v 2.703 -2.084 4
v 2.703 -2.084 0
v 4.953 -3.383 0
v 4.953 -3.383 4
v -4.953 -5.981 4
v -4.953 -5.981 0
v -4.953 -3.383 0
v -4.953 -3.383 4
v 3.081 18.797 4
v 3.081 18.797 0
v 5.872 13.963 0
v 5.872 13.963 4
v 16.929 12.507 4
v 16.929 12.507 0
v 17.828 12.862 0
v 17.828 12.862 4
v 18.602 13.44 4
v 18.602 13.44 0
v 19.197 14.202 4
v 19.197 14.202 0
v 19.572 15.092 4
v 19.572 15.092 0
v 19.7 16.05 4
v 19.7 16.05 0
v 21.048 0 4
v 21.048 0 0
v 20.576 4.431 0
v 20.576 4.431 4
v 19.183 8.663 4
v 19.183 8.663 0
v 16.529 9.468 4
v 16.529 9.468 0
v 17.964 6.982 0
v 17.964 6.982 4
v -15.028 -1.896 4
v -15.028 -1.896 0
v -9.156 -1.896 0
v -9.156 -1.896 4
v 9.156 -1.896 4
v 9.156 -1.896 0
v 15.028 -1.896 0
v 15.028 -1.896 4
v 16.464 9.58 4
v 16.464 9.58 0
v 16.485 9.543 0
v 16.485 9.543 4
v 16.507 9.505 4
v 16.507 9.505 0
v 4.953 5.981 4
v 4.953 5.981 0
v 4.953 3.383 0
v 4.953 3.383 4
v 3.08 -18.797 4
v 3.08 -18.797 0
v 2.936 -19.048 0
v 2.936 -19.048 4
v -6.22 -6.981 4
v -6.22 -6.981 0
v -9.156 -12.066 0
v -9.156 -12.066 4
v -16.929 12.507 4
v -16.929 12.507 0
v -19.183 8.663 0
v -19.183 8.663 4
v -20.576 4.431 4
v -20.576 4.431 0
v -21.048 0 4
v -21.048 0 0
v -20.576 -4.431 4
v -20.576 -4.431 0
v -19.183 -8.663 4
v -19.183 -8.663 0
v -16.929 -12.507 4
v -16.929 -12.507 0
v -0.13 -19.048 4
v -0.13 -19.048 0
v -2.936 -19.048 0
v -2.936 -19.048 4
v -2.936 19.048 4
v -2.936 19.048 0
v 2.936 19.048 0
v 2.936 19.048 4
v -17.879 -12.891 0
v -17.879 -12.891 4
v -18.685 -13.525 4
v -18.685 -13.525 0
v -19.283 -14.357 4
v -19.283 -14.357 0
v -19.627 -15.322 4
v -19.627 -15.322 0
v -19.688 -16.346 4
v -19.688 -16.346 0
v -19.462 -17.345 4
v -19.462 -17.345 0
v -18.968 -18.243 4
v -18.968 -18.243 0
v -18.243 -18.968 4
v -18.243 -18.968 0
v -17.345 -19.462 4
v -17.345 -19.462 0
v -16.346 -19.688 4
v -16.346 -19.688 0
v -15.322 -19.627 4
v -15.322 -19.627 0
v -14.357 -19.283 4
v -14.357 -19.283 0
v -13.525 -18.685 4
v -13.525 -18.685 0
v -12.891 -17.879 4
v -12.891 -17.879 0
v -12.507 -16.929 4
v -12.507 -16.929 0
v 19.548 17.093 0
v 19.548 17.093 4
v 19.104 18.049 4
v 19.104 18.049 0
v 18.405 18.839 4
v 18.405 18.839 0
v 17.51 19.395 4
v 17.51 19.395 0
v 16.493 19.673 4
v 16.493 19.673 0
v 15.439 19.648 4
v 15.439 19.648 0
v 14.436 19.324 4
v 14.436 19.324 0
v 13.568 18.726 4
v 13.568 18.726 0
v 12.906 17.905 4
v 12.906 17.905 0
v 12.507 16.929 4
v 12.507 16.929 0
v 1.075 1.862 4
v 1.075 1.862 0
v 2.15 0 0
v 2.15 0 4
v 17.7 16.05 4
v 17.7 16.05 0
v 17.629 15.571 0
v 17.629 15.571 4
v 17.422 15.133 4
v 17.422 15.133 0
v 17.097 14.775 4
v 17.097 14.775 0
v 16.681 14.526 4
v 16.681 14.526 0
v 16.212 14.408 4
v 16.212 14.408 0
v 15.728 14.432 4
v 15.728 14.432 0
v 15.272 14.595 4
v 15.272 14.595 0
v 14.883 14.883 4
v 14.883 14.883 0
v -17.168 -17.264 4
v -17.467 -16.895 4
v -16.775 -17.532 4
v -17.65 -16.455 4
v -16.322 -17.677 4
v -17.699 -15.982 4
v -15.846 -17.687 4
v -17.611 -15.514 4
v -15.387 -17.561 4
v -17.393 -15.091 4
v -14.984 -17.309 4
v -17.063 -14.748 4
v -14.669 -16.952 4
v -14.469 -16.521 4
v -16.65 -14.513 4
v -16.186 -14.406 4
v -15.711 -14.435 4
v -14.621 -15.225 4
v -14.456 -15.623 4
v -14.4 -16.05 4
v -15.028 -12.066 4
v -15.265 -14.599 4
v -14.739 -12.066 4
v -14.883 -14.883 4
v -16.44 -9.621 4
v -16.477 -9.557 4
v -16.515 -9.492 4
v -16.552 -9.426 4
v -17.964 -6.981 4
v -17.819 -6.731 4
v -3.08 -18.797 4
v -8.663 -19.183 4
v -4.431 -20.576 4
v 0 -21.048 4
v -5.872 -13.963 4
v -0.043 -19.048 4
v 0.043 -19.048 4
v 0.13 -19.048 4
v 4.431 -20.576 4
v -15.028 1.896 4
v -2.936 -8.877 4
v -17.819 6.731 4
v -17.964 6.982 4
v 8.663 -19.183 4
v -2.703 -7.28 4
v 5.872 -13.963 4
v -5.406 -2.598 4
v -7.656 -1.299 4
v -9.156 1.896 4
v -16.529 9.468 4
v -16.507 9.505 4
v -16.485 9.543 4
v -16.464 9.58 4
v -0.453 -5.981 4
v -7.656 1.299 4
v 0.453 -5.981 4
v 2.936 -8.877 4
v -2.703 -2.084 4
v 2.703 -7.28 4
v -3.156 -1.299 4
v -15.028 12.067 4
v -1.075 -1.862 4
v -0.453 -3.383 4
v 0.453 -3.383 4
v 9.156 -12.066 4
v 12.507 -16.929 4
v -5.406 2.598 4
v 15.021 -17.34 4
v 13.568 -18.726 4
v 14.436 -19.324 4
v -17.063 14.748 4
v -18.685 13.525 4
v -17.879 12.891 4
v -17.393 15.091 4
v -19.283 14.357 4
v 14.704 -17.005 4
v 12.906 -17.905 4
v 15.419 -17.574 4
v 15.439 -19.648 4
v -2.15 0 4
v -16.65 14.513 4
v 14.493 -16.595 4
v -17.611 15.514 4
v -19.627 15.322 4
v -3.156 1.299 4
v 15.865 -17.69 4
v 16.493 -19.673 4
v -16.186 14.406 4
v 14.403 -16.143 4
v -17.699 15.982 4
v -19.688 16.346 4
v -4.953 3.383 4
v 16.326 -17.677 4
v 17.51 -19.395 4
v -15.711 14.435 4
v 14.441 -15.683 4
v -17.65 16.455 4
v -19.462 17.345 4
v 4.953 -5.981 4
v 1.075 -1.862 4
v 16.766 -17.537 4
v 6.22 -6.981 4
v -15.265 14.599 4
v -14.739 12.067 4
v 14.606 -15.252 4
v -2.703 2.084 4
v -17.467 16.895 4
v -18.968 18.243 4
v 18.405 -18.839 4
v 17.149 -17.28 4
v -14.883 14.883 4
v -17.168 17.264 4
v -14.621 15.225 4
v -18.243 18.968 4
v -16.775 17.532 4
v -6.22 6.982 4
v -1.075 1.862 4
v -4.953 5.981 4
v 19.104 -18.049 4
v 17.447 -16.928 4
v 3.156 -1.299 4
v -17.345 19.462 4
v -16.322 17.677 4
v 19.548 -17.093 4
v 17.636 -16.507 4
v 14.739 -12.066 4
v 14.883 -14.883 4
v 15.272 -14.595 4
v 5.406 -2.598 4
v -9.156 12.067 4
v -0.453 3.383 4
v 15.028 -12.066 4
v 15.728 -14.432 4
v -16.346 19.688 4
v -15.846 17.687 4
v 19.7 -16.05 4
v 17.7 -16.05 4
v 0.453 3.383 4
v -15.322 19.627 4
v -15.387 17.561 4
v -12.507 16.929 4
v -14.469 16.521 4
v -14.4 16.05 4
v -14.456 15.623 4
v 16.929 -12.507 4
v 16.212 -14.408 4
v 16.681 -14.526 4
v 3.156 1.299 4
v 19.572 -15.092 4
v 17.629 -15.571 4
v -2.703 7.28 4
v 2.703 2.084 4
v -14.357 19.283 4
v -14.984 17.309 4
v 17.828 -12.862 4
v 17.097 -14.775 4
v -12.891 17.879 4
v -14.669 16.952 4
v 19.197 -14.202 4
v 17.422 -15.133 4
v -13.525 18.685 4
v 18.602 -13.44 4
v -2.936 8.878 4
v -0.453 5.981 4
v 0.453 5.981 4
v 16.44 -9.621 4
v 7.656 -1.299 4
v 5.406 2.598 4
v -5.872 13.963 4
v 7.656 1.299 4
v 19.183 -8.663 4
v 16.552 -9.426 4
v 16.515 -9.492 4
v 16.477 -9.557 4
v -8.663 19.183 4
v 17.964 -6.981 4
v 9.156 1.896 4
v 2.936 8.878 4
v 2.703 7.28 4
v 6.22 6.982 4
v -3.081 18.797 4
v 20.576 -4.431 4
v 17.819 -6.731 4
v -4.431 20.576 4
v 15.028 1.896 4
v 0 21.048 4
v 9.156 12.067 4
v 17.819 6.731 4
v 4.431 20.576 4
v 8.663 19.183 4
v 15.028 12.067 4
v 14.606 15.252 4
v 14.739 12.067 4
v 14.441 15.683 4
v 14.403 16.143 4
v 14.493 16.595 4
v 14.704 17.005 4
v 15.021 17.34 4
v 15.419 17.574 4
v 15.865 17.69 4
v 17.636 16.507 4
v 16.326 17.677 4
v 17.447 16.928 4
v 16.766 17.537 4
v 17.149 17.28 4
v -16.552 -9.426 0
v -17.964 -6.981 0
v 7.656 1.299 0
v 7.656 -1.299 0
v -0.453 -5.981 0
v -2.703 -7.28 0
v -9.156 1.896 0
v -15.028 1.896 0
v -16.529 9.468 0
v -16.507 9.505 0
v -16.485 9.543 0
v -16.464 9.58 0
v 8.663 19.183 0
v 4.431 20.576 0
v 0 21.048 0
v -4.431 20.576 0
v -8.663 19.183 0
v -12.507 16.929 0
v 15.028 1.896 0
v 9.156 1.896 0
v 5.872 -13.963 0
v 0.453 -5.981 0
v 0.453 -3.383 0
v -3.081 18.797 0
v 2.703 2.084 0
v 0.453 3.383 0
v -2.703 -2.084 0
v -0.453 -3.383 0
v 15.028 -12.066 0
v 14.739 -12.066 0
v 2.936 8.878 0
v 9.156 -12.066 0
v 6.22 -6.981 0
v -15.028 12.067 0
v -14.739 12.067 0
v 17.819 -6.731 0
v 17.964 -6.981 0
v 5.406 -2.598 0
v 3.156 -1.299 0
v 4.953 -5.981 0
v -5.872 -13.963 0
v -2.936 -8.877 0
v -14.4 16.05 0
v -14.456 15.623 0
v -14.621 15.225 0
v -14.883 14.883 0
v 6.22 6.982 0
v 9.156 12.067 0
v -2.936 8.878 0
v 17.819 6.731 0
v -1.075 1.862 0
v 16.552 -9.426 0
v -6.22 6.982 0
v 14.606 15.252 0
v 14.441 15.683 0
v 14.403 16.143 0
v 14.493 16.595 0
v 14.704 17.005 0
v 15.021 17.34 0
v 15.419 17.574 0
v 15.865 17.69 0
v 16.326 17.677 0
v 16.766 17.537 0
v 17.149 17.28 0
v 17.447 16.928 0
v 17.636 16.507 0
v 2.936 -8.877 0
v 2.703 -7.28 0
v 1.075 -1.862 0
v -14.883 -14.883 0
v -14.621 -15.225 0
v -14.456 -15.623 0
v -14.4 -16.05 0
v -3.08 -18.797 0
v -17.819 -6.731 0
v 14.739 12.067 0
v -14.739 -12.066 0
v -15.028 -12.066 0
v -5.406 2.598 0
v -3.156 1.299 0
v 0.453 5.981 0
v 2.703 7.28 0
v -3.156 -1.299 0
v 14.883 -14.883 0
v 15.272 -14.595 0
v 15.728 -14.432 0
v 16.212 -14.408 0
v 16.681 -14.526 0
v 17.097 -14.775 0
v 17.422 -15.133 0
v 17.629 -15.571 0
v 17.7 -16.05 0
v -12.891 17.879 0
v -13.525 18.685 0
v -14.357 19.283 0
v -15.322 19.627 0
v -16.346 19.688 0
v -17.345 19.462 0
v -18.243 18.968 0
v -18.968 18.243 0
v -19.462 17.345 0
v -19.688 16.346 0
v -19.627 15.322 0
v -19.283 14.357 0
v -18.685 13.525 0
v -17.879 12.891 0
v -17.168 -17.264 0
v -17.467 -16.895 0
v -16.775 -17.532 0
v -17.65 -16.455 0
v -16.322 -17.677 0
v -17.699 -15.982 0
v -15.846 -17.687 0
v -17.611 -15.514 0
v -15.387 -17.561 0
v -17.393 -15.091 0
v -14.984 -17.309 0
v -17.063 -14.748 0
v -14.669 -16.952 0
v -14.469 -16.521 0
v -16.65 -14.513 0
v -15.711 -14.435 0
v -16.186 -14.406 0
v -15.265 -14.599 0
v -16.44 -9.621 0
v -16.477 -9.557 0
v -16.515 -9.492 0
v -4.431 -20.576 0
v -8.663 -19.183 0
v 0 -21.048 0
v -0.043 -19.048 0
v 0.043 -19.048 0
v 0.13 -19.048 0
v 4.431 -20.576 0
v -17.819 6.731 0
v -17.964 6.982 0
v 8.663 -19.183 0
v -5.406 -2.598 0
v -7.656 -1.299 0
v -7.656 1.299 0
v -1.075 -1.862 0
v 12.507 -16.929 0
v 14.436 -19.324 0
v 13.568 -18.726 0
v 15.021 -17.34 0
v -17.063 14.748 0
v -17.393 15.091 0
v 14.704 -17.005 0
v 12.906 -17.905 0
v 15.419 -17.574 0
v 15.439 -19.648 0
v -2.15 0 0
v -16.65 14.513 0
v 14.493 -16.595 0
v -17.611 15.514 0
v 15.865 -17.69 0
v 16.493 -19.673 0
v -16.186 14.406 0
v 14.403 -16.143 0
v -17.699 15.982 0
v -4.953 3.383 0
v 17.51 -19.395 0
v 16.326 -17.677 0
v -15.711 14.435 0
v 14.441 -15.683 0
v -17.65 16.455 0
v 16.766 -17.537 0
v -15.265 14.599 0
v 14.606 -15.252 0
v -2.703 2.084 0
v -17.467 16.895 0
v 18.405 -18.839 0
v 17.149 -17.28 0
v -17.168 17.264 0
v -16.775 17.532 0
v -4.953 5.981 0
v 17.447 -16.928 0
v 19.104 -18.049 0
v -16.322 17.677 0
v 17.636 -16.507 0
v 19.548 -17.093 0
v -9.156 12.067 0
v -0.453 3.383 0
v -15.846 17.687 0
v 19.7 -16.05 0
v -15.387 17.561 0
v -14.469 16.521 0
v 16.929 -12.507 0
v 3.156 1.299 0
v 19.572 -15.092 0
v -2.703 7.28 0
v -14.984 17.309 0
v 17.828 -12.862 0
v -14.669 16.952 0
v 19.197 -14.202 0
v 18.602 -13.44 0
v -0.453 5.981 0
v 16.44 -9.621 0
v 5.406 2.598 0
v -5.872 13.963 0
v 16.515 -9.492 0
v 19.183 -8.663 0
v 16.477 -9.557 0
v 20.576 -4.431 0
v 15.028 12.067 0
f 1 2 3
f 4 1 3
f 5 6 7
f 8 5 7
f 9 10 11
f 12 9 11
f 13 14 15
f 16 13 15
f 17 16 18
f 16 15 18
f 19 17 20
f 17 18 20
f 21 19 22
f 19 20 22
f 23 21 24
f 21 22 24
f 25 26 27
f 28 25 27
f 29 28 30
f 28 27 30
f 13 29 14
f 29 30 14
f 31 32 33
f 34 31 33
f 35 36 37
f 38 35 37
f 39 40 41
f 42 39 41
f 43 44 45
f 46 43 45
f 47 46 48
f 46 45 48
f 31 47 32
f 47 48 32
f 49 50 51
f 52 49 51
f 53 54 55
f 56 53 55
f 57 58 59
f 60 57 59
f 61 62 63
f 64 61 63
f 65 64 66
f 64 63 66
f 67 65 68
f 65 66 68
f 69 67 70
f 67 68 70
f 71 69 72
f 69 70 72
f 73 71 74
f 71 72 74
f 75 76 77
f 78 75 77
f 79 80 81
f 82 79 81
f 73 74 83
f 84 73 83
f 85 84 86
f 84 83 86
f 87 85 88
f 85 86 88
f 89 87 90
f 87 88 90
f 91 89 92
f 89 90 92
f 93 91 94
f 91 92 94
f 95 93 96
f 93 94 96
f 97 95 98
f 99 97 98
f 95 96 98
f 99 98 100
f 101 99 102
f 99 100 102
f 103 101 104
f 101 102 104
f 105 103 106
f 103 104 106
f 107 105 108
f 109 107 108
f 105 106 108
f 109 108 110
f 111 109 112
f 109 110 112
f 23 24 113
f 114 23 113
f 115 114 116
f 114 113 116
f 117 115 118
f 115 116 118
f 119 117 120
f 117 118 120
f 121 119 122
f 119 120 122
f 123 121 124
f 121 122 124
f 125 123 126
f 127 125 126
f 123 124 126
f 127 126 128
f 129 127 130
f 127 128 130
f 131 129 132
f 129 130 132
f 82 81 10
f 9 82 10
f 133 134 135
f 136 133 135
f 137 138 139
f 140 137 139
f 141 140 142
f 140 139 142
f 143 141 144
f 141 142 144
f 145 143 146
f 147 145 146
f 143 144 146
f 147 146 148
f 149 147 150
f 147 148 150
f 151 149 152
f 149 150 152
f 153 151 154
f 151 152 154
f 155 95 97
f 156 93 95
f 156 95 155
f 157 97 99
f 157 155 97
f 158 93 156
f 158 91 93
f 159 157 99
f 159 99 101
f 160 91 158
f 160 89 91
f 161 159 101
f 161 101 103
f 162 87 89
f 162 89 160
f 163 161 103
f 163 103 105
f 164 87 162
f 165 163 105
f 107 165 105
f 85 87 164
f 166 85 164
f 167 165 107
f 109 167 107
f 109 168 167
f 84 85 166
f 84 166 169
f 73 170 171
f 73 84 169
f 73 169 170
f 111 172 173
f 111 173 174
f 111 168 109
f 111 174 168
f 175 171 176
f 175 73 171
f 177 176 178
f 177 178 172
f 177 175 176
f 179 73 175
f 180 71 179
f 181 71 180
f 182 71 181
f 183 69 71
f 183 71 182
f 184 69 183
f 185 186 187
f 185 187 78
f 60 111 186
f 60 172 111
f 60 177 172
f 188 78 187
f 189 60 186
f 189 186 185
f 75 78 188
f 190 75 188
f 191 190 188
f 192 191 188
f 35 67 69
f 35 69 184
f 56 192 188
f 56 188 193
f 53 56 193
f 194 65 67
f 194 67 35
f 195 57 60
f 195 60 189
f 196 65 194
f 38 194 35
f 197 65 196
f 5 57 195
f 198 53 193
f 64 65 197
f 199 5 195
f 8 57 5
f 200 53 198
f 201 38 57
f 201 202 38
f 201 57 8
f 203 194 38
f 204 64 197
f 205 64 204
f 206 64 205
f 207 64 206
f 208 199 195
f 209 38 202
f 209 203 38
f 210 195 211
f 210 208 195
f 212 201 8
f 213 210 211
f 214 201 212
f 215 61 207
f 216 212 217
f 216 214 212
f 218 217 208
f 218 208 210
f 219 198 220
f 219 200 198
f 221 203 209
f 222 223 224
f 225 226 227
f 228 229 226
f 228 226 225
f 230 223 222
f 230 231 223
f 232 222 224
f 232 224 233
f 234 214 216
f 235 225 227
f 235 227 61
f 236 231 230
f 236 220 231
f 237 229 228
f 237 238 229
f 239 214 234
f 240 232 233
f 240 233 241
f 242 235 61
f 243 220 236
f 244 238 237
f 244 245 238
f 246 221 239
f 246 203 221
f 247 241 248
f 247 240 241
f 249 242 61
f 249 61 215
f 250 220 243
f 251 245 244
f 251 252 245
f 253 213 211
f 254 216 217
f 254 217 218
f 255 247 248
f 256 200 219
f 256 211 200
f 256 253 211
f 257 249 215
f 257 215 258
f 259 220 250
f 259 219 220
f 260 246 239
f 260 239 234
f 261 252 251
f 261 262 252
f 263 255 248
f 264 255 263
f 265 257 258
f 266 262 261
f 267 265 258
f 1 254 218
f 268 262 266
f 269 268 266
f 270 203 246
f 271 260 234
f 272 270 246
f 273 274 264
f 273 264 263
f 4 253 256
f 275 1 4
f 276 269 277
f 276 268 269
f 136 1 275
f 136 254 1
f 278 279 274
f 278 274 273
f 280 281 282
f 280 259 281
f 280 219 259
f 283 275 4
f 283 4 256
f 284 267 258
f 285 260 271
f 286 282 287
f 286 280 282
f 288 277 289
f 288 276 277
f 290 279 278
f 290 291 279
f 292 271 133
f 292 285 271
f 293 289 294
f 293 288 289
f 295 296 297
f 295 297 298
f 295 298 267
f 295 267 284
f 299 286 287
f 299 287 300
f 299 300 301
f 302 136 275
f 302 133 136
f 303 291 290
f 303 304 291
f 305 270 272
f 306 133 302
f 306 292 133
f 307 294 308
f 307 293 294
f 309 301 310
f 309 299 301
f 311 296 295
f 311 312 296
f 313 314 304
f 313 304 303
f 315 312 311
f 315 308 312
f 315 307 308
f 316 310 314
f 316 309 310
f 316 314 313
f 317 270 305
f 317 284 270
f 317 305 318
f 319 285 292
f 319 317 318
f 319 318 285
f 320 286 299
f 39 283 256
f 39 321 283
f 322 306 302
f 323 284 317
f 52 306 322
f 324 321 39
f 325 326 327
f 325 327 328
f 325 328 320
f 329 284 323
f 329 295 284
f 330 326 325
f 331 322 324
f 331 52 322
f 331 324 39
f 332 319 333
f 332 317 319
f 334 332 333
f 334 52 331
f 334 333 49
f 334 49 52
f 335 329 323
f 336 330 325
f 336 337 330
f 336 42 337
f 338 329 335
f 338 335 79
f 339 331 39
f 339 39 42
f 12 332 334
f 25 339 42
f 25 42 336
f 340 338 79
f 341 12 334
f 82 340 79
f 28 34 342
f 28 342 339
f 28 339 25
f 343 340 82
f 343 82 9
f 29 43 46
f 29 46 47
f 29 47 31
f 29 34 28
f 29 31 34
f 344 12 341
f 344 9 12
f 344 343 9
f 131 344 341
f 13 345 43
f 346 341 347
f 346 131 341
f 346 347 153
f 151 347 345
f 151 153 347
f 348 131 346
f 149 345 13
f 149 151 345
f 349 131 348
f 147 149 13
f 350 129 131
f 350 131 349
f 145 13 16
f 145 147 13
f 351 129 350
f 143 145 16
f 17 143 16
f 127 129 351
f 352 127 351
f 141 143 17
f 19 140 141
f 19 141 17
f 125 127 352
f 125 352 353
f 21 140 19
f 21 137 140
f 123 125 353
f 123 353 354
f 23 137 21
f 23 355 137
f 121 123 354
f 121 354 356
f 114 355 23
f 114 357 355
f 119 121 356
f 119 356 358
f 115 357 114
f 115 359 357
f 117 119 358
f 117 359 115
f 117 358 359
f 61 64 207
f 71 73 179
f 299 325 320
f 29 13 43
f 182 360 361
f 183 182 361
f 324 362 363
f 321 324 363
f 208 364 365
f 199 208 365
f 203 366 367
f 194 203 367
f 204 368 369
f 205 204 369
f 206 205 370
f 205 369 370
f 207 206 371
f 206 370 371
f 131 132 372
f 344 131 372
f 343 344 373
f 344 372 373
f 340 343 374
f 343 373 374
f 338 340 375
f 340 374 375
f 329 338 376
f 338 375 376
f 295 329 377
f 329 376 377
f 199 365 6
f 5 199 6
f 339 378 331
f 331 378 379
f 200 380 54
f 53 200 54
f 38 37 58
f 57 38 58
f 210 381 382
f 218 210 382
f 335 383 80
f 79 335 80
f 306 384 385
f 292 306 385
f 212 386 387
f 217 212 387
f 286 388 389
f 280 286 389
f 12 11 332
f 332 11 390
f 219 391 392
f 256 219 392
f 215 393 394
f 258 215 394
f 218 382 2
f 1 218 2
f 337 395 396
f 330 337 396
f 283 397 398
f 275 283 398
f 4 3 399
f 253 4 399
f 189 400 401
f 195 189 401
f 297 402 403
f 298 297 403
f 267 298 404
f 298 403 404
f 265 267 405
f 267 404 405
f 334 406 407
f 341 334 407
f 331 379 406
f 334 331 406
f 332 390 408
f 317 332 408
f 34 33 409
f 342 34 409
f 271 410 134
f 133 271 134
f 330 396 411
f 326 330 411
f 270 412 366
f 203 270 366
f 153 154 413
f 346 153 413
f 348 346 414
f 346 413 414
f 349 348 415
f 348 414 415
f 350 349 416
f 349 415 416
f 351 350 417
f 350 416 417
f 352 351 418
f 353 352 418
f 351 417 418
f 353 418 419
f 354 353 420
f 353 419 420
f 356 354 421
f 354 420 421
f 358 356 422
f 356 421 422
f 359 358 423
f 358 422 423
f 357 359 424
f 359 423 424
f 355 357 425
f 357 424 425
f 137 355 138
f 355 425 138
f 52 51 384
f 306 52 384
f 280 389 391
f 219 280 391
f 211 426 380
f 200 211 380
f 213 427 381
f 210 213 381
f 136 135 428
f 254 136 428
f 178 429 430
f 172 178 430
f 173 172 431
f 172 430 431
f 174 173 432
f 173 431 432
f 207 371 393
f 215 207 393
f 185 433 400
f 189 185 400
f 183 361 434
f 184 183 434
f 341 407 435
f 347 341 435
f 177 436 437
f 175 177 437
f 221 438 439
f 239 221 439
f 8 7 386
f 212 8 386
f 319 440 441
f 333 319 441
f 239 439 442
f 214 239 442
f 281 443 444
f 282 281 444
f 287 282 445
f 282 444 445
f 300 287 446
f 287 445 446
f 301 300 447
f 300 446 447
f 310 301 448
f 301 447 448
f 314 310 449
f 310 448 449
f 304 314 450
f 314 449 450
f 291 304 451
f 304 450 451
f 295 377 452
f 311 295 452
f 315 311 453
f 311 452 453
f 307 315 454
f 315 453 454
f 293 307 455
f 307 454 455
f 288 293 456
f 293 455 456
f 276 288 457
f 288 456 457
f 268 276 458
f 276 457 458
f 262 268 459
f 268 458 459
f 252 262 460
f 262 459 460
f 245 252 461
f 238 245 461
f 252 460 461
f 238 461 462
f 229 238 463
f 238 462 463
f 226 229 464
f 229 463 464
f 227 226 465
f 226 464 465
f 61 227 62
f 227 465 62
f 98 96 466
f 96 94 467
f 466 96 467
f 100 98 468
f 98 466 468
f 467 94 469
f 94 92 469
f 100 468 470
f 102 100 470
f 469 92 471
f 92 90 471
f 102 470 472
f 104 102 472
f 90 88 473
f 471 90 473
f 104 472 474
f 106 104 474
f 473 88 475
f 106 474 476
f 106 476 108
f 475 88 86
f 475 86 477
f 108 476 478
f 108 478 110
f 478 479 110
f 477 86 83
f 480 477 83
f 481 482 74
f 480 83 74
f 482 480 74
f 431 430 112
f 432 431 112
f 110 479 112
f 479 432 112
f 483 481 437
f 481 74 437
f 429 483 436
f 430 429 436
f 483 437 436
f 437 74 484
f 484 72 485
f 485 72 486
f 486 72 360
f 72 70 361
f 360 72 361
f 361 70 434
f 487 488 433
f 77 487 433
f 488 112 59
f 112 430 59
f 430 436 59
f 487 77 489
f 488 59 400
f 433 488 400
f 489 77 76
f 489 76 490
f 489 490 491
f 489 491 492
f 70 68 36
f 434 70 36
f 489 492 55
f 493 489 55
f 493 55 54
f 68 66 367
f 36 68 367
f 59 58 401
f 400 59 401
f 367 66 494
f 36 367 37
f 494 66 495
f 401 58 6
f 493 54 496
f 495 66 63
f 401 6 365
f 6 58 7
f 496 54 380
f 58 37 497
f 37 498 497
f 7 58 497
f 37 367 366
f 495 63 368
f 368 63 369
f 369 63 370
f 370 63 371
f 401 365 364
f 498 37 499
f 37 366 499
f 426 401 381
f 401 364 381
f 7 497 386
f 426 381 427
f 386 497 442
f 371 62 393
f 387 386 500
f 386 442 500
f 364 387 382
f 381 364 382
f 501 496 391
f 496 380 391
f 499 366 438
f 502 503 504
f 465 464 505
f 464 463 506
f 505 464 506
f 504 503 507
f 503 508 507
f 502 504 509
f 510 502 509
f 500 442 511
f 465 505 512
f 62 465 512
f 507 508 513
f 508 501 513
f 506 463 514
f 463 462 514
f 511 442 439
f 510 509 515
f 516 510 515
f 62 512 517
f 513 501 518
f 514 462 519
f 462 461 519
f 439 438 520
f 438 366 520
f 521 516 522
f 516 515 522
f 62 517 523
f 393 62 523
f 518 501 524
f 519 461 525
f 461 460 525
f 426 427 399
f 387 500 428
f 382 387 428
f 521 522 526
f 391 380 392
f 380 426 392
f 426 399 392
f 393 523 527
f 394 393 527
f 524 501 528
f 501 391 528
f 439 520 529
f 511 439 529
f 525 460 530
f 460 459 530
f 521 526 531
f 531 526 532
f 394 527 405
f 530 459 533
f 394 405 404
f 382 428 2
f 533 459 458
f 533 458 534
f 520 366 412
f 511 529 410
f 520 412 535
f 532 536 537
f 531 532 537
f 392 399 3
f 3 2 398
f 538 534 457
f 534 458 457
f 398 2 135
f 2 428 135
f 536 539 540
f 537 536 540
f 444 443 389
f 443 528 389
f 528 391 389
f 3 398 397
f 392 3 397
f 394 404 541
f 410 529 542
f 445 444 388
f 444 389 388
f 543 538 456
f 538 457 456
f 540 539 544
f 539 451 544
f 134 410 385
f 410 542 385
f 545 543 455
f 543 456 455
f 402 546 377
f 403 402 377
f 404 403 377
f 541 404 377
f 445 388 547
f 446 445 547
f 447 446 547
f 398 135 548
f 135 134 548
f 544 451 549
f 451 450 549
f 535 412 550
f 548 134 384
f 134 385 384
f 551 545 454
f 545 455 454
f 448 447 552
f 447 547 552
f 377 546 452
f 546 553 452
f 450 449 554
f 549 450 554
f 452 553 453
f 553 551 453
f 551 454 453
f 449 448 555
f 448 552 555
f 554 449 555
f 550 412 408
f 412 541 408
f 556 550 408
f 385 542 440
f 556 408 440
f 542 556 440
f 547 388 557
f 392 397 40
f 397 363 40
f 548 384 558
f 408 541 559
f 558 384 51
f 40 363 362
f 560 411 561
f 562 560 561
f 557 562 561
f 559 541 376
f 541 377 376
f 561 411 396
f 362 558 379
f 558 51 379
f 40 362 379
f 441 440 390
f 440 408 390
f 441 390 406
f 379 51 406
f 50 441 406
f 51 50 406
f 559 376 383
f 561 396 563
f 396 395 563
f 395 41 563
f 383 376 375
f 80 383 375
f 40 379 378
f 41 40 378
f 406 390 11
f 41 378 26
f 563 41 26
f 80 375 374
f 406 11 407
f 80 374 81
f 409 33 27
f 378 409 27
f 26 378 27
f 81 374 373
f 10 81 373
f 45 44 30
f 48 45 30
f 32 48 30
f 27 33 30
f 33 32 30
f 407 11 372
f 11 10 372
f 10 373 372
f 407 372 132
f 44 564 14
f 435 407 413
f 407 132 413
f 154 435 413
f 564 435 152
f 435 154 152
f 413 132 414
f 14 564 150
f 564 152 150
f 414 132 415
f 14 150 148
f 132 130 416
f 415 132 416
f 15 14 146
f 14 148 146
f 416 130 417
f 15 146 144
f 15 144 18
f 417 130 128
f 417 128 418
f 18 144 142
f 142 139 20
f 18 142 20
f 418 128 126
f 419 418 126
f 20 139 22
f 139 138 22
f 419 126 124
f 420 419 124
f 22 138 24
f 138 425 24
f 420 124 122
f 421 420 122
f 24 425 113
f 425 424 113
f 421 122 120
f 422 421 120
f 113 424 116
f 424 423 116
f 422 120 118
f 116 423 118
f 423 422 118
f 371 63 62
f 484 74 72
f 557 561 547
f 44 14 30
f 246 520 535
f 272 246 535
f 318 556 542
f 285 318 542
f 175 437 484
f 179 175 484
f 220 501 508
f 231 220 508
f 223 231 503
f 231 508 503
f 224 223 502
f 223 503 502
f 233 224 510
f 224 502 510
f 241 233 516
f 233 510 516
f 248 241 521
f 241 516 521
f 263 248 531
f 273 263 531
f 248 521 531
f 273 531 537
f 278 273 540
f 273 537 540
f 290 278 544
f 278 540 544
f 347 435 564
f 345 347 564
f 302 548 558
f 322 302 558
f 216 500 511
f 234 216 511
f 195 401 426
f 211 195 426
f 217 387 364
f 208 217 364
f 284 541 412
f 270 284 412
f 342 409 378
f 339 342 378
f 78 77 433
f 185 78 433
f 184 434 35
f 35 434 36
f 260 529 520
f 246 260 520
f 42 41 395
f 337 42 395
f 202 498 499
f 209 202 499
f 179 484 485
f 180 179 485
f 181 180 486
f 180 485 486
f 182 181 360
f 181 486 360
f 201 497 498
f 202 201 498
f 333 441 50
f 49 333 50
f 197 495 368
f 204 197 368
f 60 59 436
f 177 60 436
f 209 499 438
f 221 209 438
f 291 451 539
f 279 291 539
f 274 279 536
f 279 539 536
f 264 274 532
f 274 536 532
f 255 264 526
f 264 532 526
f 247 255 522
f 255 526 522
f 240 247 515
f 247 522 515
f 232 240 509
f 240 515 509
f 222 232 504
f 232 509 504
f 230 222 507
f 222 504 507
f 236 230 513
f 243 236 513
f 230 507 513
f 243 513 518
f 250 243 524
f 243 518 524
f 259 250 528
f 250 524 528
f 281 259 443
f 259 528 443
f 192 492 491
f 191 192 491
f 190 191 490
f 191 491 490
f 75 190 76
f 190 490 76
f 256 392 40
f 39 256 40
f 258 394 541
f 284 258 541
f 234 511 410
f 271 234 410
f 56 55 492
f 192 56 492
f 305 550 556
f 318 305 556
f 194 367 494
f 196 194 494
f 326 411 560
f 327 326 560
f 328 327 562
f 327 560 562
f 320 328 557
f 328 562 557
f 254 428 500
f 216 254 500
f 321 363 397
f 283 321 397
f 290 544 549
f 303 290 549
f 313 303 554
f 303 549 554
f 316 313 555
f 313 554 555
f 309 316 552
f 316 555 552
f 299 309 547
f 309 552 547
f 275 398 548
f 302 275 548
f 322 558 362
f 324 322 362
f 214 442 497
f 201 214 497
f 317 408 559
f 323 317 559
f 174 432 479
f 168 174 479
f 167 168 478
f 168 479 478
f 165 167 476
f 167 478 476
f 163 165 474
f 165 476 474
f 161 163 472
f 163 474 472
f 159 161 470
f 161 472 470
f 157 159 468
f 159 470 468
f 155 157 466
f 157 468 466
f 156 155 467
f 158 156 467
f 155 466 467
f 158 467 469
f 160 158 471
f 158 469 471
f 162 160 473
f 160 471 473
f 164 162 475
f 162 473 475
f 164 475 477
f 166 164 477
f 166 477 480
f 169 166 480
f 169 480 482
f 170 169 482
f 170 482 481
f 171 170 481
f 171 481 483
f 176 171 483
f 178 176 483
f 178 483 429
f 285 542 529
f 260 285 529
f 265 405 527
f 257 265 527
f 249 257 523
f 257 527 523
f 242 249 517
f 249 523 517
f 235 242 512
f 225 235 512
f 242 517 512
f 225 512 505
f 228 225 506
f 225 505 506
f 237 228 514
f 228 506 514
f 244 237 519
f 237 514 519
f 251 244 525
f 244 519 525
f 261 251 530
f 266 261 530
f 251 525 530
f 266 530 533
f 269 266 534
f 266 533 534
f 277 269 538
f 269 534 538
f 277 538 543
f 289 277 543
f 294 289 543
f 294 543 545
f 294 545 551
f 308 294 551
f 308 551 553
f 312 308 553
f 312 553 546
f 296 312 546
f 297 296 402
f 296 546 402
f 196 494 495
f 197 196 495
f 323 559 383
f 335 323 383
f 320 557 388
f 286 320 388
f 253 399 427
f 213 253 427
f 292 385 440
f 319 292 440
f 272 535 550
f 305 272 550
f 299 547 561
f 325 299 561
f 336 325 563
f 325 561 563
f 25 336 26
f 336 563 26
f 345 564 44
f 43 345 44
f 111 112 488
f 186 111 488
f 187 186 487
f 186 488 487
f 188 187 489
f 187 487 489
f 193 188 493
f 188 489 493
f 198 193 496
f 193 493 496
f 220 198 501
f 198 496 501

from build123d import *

# Parameters (mm, degrees)
F1_DEPTH = 4


# Not quite as in the source:
# - ends of sketch curves that miss each other by under 0.0002 mm in the source are joined


with BuildPart() as f1:
    # F0 (on Top) → F1 (new body)
    with BuildSketch(Plane.XY):
        with BuildLine():
            ThreePointArc((-14.8832723697, 14.8832737265), (-15.9503966088, 13.7334803044), (-16.9289242157, 12.5074041331))
            ThreePointArc((-16.9289242157, 12.5074041331), (-15.0725488028, 12.533313309), (-13.4690596421, 13.4690608552))
            ThreePointArc((-13.4690596421, 13.4690608552), (-12.6778389857, 14.6532061326), (-12.3999992371, 16.0500007629))
            ThreePointArc((-12.3999992371, 16.0500007629), (-12.4269495545, 16.4927320562), (-12.5074025236, 16.9289254048))
            ThreePointArc((-12.5074025236, 16.9289254048), (-13.7334788191, 15.9503978876), (-14.8832723697, 14.8832737265))
        make_face()
        with BuildLine():
            ThreePointArc((12.5074038131, 16.9289244521), (8.016e-07, 21.0481265971), (-12.5074025236, 16.9289254048))
            ThreePointArc((-12.5074025236, 16.9289254048), (-12.4269495545, 16.4927320562), (-12.3999992371, 16.0500007629))
            ThreePointArc((-12.3999992371, 16.0500007629), (-12.6778389857, 14.6532061326), (-13.4690596421, 13.4690608552))
            ThreePointArc((-13.4690596421, 13.4690608552), (-8.6931773802, 16.9487401861), (-3.0807040231, 18.7973506001))
            Line((-3.0807040231, 18.7973506001), (-2.9359184337, 19.0481265971))
            Line((-2.9359184337, 19.0481265971), (3.1e-08, 19.0481265971))
            Line((3.1e-08, 19.0481265971), (2.9359184337, 19.0481265971))
            Line((2.9359184337, 19.0481265971), (3.0807040231, 18.7973506001))
            ThreePointArc((3.0807040231, 18.7973506001), (8.6931777594, 16.9487399916), (13.4690594818, 13.4690594896))
            ThreePointArc((13.4690594818, 13.4690594896), (12.5333135158, 15.0725495848), (12.5074038131, 16.9289244521))
        make_face()
        with BuildLine():
            ThreePointArc((14.8832730679, 14.8832730283), (13.7334798008, 15.9503970424), (12.5074038131, 16.9289244521))
            ThreePointArc((12.5074038131, 16.9289244521), (12.5333135158, 15.0725495848), (13.4690610077, 13.4690610155))
            ThreePointArc((13.4690610077, 13.4690610155), (15.0725495795, 12.5333135173), (16.9289244521, 12.5074038131))
            ThreePointArc((16.9289244521, 12.5074038131), (15.9503970607, 13.7334797795), (14.8832730679, 14.8832730283))
        make_face()
        with BuildLine():
            ThreePointArc((14.7389042455, -12.0663096472), (14.1214106882, -12.7834614653), (13.469060126, -13.4690588454))
            ThreePointArc((13.469060126, -13.4690588454), (15.0725499715, -12.5333118824), (16.9289254048, -12.5074025236))
            ThreePointArc((16.9289254048, -12.5074025236), (19.9918208065, -6.5841274356), (21.0481265971, 0))
            ThreePointArc((21.0481265971, 0), (19.9918205558, 6.584128197), (16.9289244521, 12.5074038131))
            ThreePointArc((16.9289244521, 12.5074038131), (15.0725495795, 12.5333135173), (13.4690610077, 13.4690610155))
            ThreePointArc((13.4690610077, 13.4690610155), (14.1212174462, 12.7836749293), (14.7385400167, 12.0667545362))
            Line((14.7385400167, 12.0667545362), (15.0280097995, 12.0667545415))
            Line((15.0280097995, 12.0667545415), (16.4635485578, 9.5803285823))
            ThreePointArc((16.4635485578, 9.5803285823), (16.496161351, 9.5240636044), (16.5285818567, 9.4676876093))
            Line((16.5285818567, 9.4676876093), (17.9639283275, 6.9815947019))
            Line((17.9639283275, 6.9815947019), (17.8192336321, 6.7309761272))
            ThreePointArc((17.8192336321, 6.7309761272), (18.7383850018, 3.4211188793), (19.0481265971, 0))
            ThreePointArc((19.0481265971, 0), (18.7384108655, -3.4209772138), (17.8193354047, -6.7307066936))
            Line((17.8193354047, -6.7307066936), (17.9639287158, -6.9811496335))
            Line((17.9639287158, -6.9811496335), (16.5521937692, -9.4263464974))
            ThreePointArc((16.5521937692, -9.4263464974), (16.4961618808, -9.5240626868), (16.4395531298, -9.6214458244))
            Line((16.4395531298, -9.6214458244), (15.0280104707, -12.0663096364))
            Line((15.0280104707, -12.0663096364), (14.7389042455, -12.0663096472))
        make_face()
        with BuildLine():
            ThreePointArc((13.469060889, -13.4690596084), (12.5333133154, -15.0725487798), (12.5074041331, -16.9289242157))
            ThreePointArc((12.5074041331, -16.9289242157), (13.7334803406, -15.9503965776), (14.8832737941, -14.8832723021))
            ThreePointArc((14.8832737941, -14.8832723021), (15.9503979188, -13.7334787829), (16.9289254048, -12.5074025236))
            ThreePointArc((16.9289254048, -12.5074025236), (15.0725499715, -12.5333118824), (13.469060889, -13.4690596084))
        make_face()
        with BuildLine():
            ThreePointArc((-12.3999992371, -16.0499992371), (-12.4269496351, -16.4927311897), (-12.5074028436, -16.9289251684))
            ThreePointArc((-12.5074028436, -16.9289251684), (8.016e-07, -21.0481265971), (12.5074041331, -16.9289242157))
            ThreePointArc((12.5074041331, -16.9289242157), (12.5333133154, -15.0725487798), (13.469060889, -13.4690596084))
            ThreePointArc((13.469060889, -13.4690596084), (8.693050972, -16.9488050215), (3.0804218918, -18.7973968365))
            Line((3.0804218918, -18.7973968365), (2.9359194933, -19.0476823647))
            Line((2.9359194933, -19.0476823647), (0.1300670867, -19.0476825208))
            ThreePointArc((0.1300670867, -19.0476825208), (1.0596e-06, -19.0481265971), (-0.1300649676, -19.0476825353))
            Line((-0.1300649676, -19.0476825353), (-2.9359173741, -19.0476826914))
            Line((-2.9359173741, -19.0476826914), (-3.0804198005, -18.7973971792))
            ThreePointArc((-3.0804198005, -18.7973971792), (-8.6930496263, -16.9488057118), (-13.4690594857, -13.4690594857))
            ThreePointArc((-13.4690594857, -13.4690594857), (-12.6778389434, -14.6532047089), (-12.3999992371, -16.0499992371))
        make_face()
        with BuildLine():
            ThreePointArc((-16.9289251684, -12.5074028436), (-15.9503974445, -13.7334793337), (-14.8832730474, -14.8832730488))
            ThreePointArc((-14.8832730474, -14.8832730488), (-13.733479333, -15.9503974452), (-12.5074028436, -16.9289251684))
            ThreePointArc((-12.5074028436, -16.9289251684), (-12.4269496351, -16.4927311897), (-12.3999992371, -16.0499992371))
            ThreePointArc((-12.3999992371, -16.0499992371), (-12.6778389434, -14.6532047089), (-13.4690594857, -13.4690594857))
            ThreePointArc((-13.4690594857, -13.4690594857), (-15.0725491692, -12.5333116813), (-16.9289251684, -12.5074028436))
        make_face()
        with BuildLine():
            ThreePointArc((-16.9289242157, 12.5074041331), (-21.0481265971, 8.016e-07), (-16.9289251684, -12.5074028436))
            ThreePointArc((-16.9289251684, -12.5074028436), (-15.0725491692, -12.5333116813), (-13.4690594857, -13.4690594857))
            ThreePointArc((-13.4690594857, -13.4690594857), (-14.1214096732, -12.7834625865), (-14.7389029031, -12.066311287))
            Line((-14.7389029031, -12.066311287), (-15.0280091282, -12.0663113084))
            Line((-15.0280091282, -12.0663113084), (-16.4395520575, -9.6214476566))
            ThreePointArc((-16.4395520575, -9.6214476566), (-16.4961608212, -9.5240645221), (-16.5521927222, -9.4263483357))
            Line((-16.5521927222, -9.4263483357), (-17.9639279391, -6.9811516321))
            Line((-17.9639279391, -6.9811516321), (-17.8193346558, -6.7307086762))
            ThreePointArc((-17.8193346558, -6.7307086762), (-19.0481265966, 0.0001418878), (-17.8192343809, 6.7309741447))
            Line((-17.8192343809, 6.7309741447), (-17.9639291042, 6.9815927033))
            Line((-17.9639291042, 6.9815927033), (-16.5285829132, 9.4676857649))
            ThreePointArc((-16.5285829132, 9.4676857649), (-16.4961624106, 9.5240617691), (-16.4635496205, 9.5803267561))
            Line((-16.4635496205, 9.5803267561), (-15.0280111419, 12.0667528696))
            Line((-15.0280111419, 12.0667528696), (-14.7385413592, 12.0667528964))
            ThreePointArc((-14.7385413592, 12.0667528964), (-14.1212178714, 12.7836744596), (-13.4690588792, 13.4690600923))
            ThreePointArc((-13.4690588792, 13.4690600923), (-15.0725488028, 12.533313309), (-16.9289242157, 12.5074041331))
        make_face()
        with BuildLine():
            ThreePointArc((-12.5074025236, 16.9289254048), (-18.6309388657, 18.630940637), (-16.9289242157, 12.5074041331))
            ThreePointArc((-16.9289242157, 12.5074041331), (-15.9503966088, 13.7334803044), (-14.8832723697, 14.8832737265))
            ThreePointArc((-14.8832723697, 14.8832737265), (-13.7334788191, 15.9503978876), (-12.5074025236, 16.9289254048))
        make_face()
        with BuildLine():
            ThreePointArc((-14.3999992371, 16.0500007629), (-14.5255980313, 15.4185730443), (-14.8832731326, 14.8832744894))
            ThreePointArc((-14.8832731326, 14.8832744894), (-17.5744004428, 16.6814284816), (-14.3999992371, 16.0500007629))
        make_face(mode=Mode.SUBTRACT)
        with BuildLine():
            ThreePointArc((19.7000007629, 16.0500007629), (16.492731569, 19.673050505), (12.5074038131, 16.9289244521))
            ThreePointArc((12.5074038131, 16.9289244521), (13.7334798008, 15.9503970424), (14.8832730679, 14.8832730283))
            ThreePointArc((14.8832730679, 14.8832730283), (15.9503970607, 13.7334797795), (16.9289244521, 12.5074038131))
            ThreePointArc((16.9289244521, 12.5074038131), (18.9249417593, 13.801175677), (19.7000007629, 16.0500007629))
        make_face()
        with BuildLine():
            ThreePointArc((17.7000007629, 16.0500007629), (16.6814284393, 14.5255995397), (14.8832745938, 14.8832745541))
            ThreePointArc((14.8832745938, 14.8832745541), (15.4185730866, 17.5744019862), (17.7000007629, 16.0500007629))
        make_face(mode=Mode.SUBTRACT)
        with BuildLine():
            ThreePointArc((14.8832737941, -14.8832723021), (13.7334803406, -15.9503965776), (12.5074041331, -16.9289242157))
            ThreePointArc((12.5074041331, -16.9289242157), (16.4927322284, -19.6730488985), (19.7000007629, -16.0499992371))
            ThreePointArc((19.7000007629, -16.0499992371), (18.9249420617, -13.8011745377), (16.9289254048, -12.5074025236))
            ThreePointArc((16.9289254048, -12.5074025236), (15.9503979188, -13.7334787829), (14.8832737941, -14.8832723021))
        make_face()
        with BuildLine():
            ThreePointArc((17.7000007629, -16.0499992371), (15.4185731106, -17.5744004703), (14.8832745571, -14.883273065))
            ThreePointArc((14.8832745571, -14.883273065), (16.6814284153, -14.5255980038), (17.7000007629, -16.0499992371))
        make_face(mode=Mode.SUBTRACT)
        with BuildLine():
            ThreePointArc((-12.5074028436, -16.9289251684), (-13.733479333, -15.9503974452), (-14.8832730474, -14.8832730488))
            ThreePointArc((-14.8832730474, -14.8832730488), (-15.9503974445, -13.7334793337), (-16.9289251684, -12.5074028436))
            ThreePointArc((-16.9289251684, -12.5074028436), (-18.6309389884, -18.6309389884), (-12.5074028436, -16.9289251684))
        make_face()
        with BuildLine():
            ThreePointArc((-14.8832730474, -14.8832730488), (-14.5255980082, -15.4185715741), (-14.3999992371, -16.0499992371))
            ThreePointArc((-14.3999992371, -16.0499992371), (-17.5744004659, -16.6814269), (-14.8832730474, -14.8832730488))
        make_face(mode=Mode.SUBTRACT)
        with BuildLine():
            ThreePointArc((-14.7389029031, -12.066311287), (-14.1214096732, -12.7834625865), (-13.4690594857, -13.4690594857))
            ThreePointArc((-13.4690594857, -13.4690594857), (-8.6930496263, -16.9488057118), (-3.0804198005, -18.7973971792))
            Line((-3.0804198005, -18.7973971792), (-5.8718360907, -13.9625229606))
            Line((-5.8718360907, -13.9625229606), (-2.9359179399, -8.8773629033))
            Line((-2.9359179399, -8.8773629033), (2.9359189275, -8.8773625766))
            Line((2.9359189275, -8.8773625766), (5.8718376441, -13.9625223073))
            Line((5.8718376441, -13.9625223073), (3.0804218918, -18.7973968365))
            ThreePointArc((3.0804218918, -18.7973968365), (8.693050972, -16.9488050215), (13.469060126, -13.4690588454))
            ThreePointArc((13.469060126, -13.4690588454), (14.1214106882, -12.7834614653), (14.7389042455, -12.0663096472))
            Line((14.7389042455, -12.0663096472), (9.1561736033, -12.0663098542))
            Line((9.1561736033, -12.0663098542), (6.220254981, -6.981150069))
            Line((6.220254981, -6.981150069), (9.1561732261, -1.8959900661))
            Line((9.1561732261, -1.8959900661), (15.0280100935, -1.8959898484))
            Line((15.0280100935, -1.8959898484), (17.8193354047, -6.7307066936))
            ThreePointArc((17.8193354047, -6.7307066936), (18.7384108655, -3.4209772138), (19.0481265971, 0))
            ThreePointArc((19.0481265971, 0), (18.7383850018, 3.4211188793), (17.8192336321, 6.7309761272))
            Line((17.8192336321, 6.7309761272), (15.028009988, 1.8964347534))
            Line((15.028009988, 1.8964347534), (9.1561731206, 1.8964346445))
            Line((9.1561731206, 1.8964346445), (6.2202545927, 6.9815944842))
            Line((6.2202545927, 6.9815944842), (9.1561729321, 12.0667544326))
            Line((9.1561729321, 12.0667544326), (14.7385400167, 12.0667545362))
            ThreePointArc((14.7385400167, 12.0667545362), (14.1212174462, 12.7836749293), (13.4690594818, 13.4690594896))
            ThreePointArc((13.4690594818, 13.4690594896), (8.6931777594, 16.9487399916), (3.0807040231, 18.7973506001))
            Line((3.0807040231, 18.7973506001), (5.8718368674, 13.9629667031))
            Line((5.8718368674, 13.9629667031), (2.9359184337, 8.877806809))
            Line((2.9359184337, 8.877806809), (-2.9359184337, 8.877806809))
            Line((-2.9359184337, 8.877806809), (-5.8718368674, 13.9629667031))
            Line((-5.8718368674, 13.9629667031), (-3.0807040231, 18.7973506001))
            ThreePointArc((-3.0807040231, 18.7973506001), (-8.6931773802, 16.9487401861), (-13.4690588792, 13.4690600923))
            ThreePointArc((-13.4690588792, 13.4690600923), (-14.1212178714, 12.7836744596), (-14.7385413592, 12.0667528964))
            Line((-14.7385413592, 12.0667528964), (-9.1561742745, 12.066753414))
            Line((-9.1561742745, 12.066753414), (-6.2202553694, 6.9815937921))
            Line((-6.2202553694, 6.9815937921), (-9.1561733316, 1.8964336259))
            Line((-9.1561733316, 1.8964336259), (-15.028010199, 1.8964330815))
            Line((-15.028010199, 1.8964330815), (-17.8192343809, 6.7309741447))
            ThreePointArc((-17.8192343809, 6.7309741447), (-19.0481265966, 0.0001418878), (-17.8193346558, -6.7307086762))
            Line((-17.8193346558, -6.7307086762), (-15.0280098826, -1.8959915203))
            Line((-15.0280098826, -1.8959915203), (-9.1561730152, -1.8959910848))
            Line((-9.1561730152, -1.8959910848), (-6.2202542043, -6.9811507611))
            Line((-6.2202542043, -6.9811507611), (-9.1561722608, -12.0663108729))
            Line((-9.1561722608, -12.0663108729), (-14.7389029031, -12.066311287))
        make_face()
        Polygon((-3.1563654489, -1.299038115), (-5.4063654369, -2.5980762415), (-7.6563654489, -1.2990381567), (-7.656365473, 1.2990380546), (-5.406365485, 2.5980761812), (-3.156365473, 1.2990380963), align=None, mode=Mode.SUBTRACT)
        Polygon((-0.4531827164, -3.3830117199), (-0.4531826923, -5.9810879312), (-2.7031826802, -7.2801260578), (-4.9531826923, -5.981087973), (-4.9531827164, -3.3830117616), (-2.7031827284, -2.0839736351), align=None, mode=Mode.SUBTRACT)
        Polygon((2.7031827325, -2.0839736049), (4.9531827446, -3.3830116897), (4.9531827687, -5.981087901), (2.7031827807, -7.2801260276), (0.4531827687, -5.9810879428), (0.4531827446, -3.3830117314), align=None, mode=Mode.SUBTRACT)
        Polygon((-2.7031827325, 2.0839736049), (-4.9531827446, 3.3830116897), (-4.9531827687, 5.981087901), (-2.7031827807, 7.2801260276), (-0.4531827687, 5.9810879428), (-0.4531827446, 3.3830117314), align=None, mode=Mode.SUBTRACT)
        Polygon((-2.1503604759, 0), (-1.075180238, 1.8622667994), (1.075180238, 1.8622667994), (2.1503604759, 0), (1.075180238, -1.8622667994), (-1.075180238, -1.8622667994), align=None, mode=Mode.SUBTRACT)
        Polygon((0.4531826923, 5.9810879312), (2.7031826802, 7.2801260578), (4.9531826923, 5.981087973), (4.9531827164, 3.3830117616), (2.7031827284, 2.0839736351), (0.4531827164, 3.3830117199), align=None, mode=Mode.SUBTRACT)
        Polygon((3.1563654489, 1.299038115), (5.4063654369, 2.5980762415), (7.6563654489, 1.2990381567), (7.656365473, -1.2990380546), (5.406365485, -2.5980761812), (3.156365473, -1.2990380963), align=None, mode=Mode.SUBTRACT)
    extrude(amount=F1_DEPTH)


solid = f1.part
